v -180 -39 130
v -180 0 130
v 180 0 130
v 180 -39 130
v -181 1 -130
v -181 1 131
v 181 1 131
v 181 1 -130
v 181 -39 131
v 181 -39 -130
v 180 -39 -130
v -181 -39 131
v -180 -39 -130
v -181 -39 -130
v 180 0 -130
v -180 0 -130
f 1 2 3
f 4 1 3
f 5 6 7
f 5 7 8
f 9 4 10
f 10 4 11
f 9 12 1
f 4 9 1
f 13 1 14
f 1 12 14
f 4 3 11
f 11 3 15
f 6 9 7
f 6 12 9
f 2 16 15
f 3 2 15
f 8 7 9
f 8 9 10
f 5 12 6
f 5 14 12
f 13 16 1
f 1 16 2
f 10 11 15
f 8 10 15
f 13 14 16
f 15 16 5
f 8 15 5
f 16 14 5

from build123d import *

# Parameters (mm, degrees)
ESBO_O2_W                = 360
ESBO_O2_H                = 260
RESSALTO_EXTRUS_O1_DEPTH = 1
ESBO_O3_W                = 260
ESBO_O3_H                = 40
RESSALTO_EXTRUS_O2_DEPTH = 1
ESBO_O5_W                = 361
ESBO_O5_H                = 40
RESSALTO_EXTRUS_O3_DEPTH = 1
ESBO_O6_W                = 261
ESBO_O6_H                = 40
RESSALTO_EXTRUS_O4_DEPTH = 1


with BuildPart() as part:
    # Esboço2 → Ressalto-extrusão1 (new body)
    with BuildSketch(Plane(origin=(0, 0, 0), x_dir=(1, 0, 0), z_dir=(0, 1, 0))):
        Rectangle(ESBO_O2_W, ESBO_O2_H)
    extrude(amount=RESSALTO_EXTRUS_O1_DEPTH)

    # Esboço3 → Ressalto-extrusão2 (add)
    with BuildSketch(Plane.ZY.offset(180)):
        with Locations((0, -19)):
            Rectangle(ESBO_O3_W, ESBO_O3_H)
    extrude(amount=RESSALTO_EXTRUS_O2_DEPTH)

    # Esboço5 → Ressalto-extrusão3 (add)
    with BuildSketch(Plane.XY.offset(130)):
        with Locations((-0.5, -19)):
            Rectangle(ESBO_O5_W, ESBO_O5_H)
    extrude(amount=RESSALTO_EXTRUS_O3_DEPTH)

    # Esboço6 → Ressalto-extrusão4 (add)
    with BuildSketch(Plane(origin=(180, 0, 0), x_dir=(0, 0, -1), z_dir=(1, 0, 0))):
        with Locations((-0.5, -19)):
            Rectangle(ESBO_O6_W, ESBO_O6_H)
    extrude(amount=RESSALTO_EXTRUS_O4_DEPTH)


solid = part.part
